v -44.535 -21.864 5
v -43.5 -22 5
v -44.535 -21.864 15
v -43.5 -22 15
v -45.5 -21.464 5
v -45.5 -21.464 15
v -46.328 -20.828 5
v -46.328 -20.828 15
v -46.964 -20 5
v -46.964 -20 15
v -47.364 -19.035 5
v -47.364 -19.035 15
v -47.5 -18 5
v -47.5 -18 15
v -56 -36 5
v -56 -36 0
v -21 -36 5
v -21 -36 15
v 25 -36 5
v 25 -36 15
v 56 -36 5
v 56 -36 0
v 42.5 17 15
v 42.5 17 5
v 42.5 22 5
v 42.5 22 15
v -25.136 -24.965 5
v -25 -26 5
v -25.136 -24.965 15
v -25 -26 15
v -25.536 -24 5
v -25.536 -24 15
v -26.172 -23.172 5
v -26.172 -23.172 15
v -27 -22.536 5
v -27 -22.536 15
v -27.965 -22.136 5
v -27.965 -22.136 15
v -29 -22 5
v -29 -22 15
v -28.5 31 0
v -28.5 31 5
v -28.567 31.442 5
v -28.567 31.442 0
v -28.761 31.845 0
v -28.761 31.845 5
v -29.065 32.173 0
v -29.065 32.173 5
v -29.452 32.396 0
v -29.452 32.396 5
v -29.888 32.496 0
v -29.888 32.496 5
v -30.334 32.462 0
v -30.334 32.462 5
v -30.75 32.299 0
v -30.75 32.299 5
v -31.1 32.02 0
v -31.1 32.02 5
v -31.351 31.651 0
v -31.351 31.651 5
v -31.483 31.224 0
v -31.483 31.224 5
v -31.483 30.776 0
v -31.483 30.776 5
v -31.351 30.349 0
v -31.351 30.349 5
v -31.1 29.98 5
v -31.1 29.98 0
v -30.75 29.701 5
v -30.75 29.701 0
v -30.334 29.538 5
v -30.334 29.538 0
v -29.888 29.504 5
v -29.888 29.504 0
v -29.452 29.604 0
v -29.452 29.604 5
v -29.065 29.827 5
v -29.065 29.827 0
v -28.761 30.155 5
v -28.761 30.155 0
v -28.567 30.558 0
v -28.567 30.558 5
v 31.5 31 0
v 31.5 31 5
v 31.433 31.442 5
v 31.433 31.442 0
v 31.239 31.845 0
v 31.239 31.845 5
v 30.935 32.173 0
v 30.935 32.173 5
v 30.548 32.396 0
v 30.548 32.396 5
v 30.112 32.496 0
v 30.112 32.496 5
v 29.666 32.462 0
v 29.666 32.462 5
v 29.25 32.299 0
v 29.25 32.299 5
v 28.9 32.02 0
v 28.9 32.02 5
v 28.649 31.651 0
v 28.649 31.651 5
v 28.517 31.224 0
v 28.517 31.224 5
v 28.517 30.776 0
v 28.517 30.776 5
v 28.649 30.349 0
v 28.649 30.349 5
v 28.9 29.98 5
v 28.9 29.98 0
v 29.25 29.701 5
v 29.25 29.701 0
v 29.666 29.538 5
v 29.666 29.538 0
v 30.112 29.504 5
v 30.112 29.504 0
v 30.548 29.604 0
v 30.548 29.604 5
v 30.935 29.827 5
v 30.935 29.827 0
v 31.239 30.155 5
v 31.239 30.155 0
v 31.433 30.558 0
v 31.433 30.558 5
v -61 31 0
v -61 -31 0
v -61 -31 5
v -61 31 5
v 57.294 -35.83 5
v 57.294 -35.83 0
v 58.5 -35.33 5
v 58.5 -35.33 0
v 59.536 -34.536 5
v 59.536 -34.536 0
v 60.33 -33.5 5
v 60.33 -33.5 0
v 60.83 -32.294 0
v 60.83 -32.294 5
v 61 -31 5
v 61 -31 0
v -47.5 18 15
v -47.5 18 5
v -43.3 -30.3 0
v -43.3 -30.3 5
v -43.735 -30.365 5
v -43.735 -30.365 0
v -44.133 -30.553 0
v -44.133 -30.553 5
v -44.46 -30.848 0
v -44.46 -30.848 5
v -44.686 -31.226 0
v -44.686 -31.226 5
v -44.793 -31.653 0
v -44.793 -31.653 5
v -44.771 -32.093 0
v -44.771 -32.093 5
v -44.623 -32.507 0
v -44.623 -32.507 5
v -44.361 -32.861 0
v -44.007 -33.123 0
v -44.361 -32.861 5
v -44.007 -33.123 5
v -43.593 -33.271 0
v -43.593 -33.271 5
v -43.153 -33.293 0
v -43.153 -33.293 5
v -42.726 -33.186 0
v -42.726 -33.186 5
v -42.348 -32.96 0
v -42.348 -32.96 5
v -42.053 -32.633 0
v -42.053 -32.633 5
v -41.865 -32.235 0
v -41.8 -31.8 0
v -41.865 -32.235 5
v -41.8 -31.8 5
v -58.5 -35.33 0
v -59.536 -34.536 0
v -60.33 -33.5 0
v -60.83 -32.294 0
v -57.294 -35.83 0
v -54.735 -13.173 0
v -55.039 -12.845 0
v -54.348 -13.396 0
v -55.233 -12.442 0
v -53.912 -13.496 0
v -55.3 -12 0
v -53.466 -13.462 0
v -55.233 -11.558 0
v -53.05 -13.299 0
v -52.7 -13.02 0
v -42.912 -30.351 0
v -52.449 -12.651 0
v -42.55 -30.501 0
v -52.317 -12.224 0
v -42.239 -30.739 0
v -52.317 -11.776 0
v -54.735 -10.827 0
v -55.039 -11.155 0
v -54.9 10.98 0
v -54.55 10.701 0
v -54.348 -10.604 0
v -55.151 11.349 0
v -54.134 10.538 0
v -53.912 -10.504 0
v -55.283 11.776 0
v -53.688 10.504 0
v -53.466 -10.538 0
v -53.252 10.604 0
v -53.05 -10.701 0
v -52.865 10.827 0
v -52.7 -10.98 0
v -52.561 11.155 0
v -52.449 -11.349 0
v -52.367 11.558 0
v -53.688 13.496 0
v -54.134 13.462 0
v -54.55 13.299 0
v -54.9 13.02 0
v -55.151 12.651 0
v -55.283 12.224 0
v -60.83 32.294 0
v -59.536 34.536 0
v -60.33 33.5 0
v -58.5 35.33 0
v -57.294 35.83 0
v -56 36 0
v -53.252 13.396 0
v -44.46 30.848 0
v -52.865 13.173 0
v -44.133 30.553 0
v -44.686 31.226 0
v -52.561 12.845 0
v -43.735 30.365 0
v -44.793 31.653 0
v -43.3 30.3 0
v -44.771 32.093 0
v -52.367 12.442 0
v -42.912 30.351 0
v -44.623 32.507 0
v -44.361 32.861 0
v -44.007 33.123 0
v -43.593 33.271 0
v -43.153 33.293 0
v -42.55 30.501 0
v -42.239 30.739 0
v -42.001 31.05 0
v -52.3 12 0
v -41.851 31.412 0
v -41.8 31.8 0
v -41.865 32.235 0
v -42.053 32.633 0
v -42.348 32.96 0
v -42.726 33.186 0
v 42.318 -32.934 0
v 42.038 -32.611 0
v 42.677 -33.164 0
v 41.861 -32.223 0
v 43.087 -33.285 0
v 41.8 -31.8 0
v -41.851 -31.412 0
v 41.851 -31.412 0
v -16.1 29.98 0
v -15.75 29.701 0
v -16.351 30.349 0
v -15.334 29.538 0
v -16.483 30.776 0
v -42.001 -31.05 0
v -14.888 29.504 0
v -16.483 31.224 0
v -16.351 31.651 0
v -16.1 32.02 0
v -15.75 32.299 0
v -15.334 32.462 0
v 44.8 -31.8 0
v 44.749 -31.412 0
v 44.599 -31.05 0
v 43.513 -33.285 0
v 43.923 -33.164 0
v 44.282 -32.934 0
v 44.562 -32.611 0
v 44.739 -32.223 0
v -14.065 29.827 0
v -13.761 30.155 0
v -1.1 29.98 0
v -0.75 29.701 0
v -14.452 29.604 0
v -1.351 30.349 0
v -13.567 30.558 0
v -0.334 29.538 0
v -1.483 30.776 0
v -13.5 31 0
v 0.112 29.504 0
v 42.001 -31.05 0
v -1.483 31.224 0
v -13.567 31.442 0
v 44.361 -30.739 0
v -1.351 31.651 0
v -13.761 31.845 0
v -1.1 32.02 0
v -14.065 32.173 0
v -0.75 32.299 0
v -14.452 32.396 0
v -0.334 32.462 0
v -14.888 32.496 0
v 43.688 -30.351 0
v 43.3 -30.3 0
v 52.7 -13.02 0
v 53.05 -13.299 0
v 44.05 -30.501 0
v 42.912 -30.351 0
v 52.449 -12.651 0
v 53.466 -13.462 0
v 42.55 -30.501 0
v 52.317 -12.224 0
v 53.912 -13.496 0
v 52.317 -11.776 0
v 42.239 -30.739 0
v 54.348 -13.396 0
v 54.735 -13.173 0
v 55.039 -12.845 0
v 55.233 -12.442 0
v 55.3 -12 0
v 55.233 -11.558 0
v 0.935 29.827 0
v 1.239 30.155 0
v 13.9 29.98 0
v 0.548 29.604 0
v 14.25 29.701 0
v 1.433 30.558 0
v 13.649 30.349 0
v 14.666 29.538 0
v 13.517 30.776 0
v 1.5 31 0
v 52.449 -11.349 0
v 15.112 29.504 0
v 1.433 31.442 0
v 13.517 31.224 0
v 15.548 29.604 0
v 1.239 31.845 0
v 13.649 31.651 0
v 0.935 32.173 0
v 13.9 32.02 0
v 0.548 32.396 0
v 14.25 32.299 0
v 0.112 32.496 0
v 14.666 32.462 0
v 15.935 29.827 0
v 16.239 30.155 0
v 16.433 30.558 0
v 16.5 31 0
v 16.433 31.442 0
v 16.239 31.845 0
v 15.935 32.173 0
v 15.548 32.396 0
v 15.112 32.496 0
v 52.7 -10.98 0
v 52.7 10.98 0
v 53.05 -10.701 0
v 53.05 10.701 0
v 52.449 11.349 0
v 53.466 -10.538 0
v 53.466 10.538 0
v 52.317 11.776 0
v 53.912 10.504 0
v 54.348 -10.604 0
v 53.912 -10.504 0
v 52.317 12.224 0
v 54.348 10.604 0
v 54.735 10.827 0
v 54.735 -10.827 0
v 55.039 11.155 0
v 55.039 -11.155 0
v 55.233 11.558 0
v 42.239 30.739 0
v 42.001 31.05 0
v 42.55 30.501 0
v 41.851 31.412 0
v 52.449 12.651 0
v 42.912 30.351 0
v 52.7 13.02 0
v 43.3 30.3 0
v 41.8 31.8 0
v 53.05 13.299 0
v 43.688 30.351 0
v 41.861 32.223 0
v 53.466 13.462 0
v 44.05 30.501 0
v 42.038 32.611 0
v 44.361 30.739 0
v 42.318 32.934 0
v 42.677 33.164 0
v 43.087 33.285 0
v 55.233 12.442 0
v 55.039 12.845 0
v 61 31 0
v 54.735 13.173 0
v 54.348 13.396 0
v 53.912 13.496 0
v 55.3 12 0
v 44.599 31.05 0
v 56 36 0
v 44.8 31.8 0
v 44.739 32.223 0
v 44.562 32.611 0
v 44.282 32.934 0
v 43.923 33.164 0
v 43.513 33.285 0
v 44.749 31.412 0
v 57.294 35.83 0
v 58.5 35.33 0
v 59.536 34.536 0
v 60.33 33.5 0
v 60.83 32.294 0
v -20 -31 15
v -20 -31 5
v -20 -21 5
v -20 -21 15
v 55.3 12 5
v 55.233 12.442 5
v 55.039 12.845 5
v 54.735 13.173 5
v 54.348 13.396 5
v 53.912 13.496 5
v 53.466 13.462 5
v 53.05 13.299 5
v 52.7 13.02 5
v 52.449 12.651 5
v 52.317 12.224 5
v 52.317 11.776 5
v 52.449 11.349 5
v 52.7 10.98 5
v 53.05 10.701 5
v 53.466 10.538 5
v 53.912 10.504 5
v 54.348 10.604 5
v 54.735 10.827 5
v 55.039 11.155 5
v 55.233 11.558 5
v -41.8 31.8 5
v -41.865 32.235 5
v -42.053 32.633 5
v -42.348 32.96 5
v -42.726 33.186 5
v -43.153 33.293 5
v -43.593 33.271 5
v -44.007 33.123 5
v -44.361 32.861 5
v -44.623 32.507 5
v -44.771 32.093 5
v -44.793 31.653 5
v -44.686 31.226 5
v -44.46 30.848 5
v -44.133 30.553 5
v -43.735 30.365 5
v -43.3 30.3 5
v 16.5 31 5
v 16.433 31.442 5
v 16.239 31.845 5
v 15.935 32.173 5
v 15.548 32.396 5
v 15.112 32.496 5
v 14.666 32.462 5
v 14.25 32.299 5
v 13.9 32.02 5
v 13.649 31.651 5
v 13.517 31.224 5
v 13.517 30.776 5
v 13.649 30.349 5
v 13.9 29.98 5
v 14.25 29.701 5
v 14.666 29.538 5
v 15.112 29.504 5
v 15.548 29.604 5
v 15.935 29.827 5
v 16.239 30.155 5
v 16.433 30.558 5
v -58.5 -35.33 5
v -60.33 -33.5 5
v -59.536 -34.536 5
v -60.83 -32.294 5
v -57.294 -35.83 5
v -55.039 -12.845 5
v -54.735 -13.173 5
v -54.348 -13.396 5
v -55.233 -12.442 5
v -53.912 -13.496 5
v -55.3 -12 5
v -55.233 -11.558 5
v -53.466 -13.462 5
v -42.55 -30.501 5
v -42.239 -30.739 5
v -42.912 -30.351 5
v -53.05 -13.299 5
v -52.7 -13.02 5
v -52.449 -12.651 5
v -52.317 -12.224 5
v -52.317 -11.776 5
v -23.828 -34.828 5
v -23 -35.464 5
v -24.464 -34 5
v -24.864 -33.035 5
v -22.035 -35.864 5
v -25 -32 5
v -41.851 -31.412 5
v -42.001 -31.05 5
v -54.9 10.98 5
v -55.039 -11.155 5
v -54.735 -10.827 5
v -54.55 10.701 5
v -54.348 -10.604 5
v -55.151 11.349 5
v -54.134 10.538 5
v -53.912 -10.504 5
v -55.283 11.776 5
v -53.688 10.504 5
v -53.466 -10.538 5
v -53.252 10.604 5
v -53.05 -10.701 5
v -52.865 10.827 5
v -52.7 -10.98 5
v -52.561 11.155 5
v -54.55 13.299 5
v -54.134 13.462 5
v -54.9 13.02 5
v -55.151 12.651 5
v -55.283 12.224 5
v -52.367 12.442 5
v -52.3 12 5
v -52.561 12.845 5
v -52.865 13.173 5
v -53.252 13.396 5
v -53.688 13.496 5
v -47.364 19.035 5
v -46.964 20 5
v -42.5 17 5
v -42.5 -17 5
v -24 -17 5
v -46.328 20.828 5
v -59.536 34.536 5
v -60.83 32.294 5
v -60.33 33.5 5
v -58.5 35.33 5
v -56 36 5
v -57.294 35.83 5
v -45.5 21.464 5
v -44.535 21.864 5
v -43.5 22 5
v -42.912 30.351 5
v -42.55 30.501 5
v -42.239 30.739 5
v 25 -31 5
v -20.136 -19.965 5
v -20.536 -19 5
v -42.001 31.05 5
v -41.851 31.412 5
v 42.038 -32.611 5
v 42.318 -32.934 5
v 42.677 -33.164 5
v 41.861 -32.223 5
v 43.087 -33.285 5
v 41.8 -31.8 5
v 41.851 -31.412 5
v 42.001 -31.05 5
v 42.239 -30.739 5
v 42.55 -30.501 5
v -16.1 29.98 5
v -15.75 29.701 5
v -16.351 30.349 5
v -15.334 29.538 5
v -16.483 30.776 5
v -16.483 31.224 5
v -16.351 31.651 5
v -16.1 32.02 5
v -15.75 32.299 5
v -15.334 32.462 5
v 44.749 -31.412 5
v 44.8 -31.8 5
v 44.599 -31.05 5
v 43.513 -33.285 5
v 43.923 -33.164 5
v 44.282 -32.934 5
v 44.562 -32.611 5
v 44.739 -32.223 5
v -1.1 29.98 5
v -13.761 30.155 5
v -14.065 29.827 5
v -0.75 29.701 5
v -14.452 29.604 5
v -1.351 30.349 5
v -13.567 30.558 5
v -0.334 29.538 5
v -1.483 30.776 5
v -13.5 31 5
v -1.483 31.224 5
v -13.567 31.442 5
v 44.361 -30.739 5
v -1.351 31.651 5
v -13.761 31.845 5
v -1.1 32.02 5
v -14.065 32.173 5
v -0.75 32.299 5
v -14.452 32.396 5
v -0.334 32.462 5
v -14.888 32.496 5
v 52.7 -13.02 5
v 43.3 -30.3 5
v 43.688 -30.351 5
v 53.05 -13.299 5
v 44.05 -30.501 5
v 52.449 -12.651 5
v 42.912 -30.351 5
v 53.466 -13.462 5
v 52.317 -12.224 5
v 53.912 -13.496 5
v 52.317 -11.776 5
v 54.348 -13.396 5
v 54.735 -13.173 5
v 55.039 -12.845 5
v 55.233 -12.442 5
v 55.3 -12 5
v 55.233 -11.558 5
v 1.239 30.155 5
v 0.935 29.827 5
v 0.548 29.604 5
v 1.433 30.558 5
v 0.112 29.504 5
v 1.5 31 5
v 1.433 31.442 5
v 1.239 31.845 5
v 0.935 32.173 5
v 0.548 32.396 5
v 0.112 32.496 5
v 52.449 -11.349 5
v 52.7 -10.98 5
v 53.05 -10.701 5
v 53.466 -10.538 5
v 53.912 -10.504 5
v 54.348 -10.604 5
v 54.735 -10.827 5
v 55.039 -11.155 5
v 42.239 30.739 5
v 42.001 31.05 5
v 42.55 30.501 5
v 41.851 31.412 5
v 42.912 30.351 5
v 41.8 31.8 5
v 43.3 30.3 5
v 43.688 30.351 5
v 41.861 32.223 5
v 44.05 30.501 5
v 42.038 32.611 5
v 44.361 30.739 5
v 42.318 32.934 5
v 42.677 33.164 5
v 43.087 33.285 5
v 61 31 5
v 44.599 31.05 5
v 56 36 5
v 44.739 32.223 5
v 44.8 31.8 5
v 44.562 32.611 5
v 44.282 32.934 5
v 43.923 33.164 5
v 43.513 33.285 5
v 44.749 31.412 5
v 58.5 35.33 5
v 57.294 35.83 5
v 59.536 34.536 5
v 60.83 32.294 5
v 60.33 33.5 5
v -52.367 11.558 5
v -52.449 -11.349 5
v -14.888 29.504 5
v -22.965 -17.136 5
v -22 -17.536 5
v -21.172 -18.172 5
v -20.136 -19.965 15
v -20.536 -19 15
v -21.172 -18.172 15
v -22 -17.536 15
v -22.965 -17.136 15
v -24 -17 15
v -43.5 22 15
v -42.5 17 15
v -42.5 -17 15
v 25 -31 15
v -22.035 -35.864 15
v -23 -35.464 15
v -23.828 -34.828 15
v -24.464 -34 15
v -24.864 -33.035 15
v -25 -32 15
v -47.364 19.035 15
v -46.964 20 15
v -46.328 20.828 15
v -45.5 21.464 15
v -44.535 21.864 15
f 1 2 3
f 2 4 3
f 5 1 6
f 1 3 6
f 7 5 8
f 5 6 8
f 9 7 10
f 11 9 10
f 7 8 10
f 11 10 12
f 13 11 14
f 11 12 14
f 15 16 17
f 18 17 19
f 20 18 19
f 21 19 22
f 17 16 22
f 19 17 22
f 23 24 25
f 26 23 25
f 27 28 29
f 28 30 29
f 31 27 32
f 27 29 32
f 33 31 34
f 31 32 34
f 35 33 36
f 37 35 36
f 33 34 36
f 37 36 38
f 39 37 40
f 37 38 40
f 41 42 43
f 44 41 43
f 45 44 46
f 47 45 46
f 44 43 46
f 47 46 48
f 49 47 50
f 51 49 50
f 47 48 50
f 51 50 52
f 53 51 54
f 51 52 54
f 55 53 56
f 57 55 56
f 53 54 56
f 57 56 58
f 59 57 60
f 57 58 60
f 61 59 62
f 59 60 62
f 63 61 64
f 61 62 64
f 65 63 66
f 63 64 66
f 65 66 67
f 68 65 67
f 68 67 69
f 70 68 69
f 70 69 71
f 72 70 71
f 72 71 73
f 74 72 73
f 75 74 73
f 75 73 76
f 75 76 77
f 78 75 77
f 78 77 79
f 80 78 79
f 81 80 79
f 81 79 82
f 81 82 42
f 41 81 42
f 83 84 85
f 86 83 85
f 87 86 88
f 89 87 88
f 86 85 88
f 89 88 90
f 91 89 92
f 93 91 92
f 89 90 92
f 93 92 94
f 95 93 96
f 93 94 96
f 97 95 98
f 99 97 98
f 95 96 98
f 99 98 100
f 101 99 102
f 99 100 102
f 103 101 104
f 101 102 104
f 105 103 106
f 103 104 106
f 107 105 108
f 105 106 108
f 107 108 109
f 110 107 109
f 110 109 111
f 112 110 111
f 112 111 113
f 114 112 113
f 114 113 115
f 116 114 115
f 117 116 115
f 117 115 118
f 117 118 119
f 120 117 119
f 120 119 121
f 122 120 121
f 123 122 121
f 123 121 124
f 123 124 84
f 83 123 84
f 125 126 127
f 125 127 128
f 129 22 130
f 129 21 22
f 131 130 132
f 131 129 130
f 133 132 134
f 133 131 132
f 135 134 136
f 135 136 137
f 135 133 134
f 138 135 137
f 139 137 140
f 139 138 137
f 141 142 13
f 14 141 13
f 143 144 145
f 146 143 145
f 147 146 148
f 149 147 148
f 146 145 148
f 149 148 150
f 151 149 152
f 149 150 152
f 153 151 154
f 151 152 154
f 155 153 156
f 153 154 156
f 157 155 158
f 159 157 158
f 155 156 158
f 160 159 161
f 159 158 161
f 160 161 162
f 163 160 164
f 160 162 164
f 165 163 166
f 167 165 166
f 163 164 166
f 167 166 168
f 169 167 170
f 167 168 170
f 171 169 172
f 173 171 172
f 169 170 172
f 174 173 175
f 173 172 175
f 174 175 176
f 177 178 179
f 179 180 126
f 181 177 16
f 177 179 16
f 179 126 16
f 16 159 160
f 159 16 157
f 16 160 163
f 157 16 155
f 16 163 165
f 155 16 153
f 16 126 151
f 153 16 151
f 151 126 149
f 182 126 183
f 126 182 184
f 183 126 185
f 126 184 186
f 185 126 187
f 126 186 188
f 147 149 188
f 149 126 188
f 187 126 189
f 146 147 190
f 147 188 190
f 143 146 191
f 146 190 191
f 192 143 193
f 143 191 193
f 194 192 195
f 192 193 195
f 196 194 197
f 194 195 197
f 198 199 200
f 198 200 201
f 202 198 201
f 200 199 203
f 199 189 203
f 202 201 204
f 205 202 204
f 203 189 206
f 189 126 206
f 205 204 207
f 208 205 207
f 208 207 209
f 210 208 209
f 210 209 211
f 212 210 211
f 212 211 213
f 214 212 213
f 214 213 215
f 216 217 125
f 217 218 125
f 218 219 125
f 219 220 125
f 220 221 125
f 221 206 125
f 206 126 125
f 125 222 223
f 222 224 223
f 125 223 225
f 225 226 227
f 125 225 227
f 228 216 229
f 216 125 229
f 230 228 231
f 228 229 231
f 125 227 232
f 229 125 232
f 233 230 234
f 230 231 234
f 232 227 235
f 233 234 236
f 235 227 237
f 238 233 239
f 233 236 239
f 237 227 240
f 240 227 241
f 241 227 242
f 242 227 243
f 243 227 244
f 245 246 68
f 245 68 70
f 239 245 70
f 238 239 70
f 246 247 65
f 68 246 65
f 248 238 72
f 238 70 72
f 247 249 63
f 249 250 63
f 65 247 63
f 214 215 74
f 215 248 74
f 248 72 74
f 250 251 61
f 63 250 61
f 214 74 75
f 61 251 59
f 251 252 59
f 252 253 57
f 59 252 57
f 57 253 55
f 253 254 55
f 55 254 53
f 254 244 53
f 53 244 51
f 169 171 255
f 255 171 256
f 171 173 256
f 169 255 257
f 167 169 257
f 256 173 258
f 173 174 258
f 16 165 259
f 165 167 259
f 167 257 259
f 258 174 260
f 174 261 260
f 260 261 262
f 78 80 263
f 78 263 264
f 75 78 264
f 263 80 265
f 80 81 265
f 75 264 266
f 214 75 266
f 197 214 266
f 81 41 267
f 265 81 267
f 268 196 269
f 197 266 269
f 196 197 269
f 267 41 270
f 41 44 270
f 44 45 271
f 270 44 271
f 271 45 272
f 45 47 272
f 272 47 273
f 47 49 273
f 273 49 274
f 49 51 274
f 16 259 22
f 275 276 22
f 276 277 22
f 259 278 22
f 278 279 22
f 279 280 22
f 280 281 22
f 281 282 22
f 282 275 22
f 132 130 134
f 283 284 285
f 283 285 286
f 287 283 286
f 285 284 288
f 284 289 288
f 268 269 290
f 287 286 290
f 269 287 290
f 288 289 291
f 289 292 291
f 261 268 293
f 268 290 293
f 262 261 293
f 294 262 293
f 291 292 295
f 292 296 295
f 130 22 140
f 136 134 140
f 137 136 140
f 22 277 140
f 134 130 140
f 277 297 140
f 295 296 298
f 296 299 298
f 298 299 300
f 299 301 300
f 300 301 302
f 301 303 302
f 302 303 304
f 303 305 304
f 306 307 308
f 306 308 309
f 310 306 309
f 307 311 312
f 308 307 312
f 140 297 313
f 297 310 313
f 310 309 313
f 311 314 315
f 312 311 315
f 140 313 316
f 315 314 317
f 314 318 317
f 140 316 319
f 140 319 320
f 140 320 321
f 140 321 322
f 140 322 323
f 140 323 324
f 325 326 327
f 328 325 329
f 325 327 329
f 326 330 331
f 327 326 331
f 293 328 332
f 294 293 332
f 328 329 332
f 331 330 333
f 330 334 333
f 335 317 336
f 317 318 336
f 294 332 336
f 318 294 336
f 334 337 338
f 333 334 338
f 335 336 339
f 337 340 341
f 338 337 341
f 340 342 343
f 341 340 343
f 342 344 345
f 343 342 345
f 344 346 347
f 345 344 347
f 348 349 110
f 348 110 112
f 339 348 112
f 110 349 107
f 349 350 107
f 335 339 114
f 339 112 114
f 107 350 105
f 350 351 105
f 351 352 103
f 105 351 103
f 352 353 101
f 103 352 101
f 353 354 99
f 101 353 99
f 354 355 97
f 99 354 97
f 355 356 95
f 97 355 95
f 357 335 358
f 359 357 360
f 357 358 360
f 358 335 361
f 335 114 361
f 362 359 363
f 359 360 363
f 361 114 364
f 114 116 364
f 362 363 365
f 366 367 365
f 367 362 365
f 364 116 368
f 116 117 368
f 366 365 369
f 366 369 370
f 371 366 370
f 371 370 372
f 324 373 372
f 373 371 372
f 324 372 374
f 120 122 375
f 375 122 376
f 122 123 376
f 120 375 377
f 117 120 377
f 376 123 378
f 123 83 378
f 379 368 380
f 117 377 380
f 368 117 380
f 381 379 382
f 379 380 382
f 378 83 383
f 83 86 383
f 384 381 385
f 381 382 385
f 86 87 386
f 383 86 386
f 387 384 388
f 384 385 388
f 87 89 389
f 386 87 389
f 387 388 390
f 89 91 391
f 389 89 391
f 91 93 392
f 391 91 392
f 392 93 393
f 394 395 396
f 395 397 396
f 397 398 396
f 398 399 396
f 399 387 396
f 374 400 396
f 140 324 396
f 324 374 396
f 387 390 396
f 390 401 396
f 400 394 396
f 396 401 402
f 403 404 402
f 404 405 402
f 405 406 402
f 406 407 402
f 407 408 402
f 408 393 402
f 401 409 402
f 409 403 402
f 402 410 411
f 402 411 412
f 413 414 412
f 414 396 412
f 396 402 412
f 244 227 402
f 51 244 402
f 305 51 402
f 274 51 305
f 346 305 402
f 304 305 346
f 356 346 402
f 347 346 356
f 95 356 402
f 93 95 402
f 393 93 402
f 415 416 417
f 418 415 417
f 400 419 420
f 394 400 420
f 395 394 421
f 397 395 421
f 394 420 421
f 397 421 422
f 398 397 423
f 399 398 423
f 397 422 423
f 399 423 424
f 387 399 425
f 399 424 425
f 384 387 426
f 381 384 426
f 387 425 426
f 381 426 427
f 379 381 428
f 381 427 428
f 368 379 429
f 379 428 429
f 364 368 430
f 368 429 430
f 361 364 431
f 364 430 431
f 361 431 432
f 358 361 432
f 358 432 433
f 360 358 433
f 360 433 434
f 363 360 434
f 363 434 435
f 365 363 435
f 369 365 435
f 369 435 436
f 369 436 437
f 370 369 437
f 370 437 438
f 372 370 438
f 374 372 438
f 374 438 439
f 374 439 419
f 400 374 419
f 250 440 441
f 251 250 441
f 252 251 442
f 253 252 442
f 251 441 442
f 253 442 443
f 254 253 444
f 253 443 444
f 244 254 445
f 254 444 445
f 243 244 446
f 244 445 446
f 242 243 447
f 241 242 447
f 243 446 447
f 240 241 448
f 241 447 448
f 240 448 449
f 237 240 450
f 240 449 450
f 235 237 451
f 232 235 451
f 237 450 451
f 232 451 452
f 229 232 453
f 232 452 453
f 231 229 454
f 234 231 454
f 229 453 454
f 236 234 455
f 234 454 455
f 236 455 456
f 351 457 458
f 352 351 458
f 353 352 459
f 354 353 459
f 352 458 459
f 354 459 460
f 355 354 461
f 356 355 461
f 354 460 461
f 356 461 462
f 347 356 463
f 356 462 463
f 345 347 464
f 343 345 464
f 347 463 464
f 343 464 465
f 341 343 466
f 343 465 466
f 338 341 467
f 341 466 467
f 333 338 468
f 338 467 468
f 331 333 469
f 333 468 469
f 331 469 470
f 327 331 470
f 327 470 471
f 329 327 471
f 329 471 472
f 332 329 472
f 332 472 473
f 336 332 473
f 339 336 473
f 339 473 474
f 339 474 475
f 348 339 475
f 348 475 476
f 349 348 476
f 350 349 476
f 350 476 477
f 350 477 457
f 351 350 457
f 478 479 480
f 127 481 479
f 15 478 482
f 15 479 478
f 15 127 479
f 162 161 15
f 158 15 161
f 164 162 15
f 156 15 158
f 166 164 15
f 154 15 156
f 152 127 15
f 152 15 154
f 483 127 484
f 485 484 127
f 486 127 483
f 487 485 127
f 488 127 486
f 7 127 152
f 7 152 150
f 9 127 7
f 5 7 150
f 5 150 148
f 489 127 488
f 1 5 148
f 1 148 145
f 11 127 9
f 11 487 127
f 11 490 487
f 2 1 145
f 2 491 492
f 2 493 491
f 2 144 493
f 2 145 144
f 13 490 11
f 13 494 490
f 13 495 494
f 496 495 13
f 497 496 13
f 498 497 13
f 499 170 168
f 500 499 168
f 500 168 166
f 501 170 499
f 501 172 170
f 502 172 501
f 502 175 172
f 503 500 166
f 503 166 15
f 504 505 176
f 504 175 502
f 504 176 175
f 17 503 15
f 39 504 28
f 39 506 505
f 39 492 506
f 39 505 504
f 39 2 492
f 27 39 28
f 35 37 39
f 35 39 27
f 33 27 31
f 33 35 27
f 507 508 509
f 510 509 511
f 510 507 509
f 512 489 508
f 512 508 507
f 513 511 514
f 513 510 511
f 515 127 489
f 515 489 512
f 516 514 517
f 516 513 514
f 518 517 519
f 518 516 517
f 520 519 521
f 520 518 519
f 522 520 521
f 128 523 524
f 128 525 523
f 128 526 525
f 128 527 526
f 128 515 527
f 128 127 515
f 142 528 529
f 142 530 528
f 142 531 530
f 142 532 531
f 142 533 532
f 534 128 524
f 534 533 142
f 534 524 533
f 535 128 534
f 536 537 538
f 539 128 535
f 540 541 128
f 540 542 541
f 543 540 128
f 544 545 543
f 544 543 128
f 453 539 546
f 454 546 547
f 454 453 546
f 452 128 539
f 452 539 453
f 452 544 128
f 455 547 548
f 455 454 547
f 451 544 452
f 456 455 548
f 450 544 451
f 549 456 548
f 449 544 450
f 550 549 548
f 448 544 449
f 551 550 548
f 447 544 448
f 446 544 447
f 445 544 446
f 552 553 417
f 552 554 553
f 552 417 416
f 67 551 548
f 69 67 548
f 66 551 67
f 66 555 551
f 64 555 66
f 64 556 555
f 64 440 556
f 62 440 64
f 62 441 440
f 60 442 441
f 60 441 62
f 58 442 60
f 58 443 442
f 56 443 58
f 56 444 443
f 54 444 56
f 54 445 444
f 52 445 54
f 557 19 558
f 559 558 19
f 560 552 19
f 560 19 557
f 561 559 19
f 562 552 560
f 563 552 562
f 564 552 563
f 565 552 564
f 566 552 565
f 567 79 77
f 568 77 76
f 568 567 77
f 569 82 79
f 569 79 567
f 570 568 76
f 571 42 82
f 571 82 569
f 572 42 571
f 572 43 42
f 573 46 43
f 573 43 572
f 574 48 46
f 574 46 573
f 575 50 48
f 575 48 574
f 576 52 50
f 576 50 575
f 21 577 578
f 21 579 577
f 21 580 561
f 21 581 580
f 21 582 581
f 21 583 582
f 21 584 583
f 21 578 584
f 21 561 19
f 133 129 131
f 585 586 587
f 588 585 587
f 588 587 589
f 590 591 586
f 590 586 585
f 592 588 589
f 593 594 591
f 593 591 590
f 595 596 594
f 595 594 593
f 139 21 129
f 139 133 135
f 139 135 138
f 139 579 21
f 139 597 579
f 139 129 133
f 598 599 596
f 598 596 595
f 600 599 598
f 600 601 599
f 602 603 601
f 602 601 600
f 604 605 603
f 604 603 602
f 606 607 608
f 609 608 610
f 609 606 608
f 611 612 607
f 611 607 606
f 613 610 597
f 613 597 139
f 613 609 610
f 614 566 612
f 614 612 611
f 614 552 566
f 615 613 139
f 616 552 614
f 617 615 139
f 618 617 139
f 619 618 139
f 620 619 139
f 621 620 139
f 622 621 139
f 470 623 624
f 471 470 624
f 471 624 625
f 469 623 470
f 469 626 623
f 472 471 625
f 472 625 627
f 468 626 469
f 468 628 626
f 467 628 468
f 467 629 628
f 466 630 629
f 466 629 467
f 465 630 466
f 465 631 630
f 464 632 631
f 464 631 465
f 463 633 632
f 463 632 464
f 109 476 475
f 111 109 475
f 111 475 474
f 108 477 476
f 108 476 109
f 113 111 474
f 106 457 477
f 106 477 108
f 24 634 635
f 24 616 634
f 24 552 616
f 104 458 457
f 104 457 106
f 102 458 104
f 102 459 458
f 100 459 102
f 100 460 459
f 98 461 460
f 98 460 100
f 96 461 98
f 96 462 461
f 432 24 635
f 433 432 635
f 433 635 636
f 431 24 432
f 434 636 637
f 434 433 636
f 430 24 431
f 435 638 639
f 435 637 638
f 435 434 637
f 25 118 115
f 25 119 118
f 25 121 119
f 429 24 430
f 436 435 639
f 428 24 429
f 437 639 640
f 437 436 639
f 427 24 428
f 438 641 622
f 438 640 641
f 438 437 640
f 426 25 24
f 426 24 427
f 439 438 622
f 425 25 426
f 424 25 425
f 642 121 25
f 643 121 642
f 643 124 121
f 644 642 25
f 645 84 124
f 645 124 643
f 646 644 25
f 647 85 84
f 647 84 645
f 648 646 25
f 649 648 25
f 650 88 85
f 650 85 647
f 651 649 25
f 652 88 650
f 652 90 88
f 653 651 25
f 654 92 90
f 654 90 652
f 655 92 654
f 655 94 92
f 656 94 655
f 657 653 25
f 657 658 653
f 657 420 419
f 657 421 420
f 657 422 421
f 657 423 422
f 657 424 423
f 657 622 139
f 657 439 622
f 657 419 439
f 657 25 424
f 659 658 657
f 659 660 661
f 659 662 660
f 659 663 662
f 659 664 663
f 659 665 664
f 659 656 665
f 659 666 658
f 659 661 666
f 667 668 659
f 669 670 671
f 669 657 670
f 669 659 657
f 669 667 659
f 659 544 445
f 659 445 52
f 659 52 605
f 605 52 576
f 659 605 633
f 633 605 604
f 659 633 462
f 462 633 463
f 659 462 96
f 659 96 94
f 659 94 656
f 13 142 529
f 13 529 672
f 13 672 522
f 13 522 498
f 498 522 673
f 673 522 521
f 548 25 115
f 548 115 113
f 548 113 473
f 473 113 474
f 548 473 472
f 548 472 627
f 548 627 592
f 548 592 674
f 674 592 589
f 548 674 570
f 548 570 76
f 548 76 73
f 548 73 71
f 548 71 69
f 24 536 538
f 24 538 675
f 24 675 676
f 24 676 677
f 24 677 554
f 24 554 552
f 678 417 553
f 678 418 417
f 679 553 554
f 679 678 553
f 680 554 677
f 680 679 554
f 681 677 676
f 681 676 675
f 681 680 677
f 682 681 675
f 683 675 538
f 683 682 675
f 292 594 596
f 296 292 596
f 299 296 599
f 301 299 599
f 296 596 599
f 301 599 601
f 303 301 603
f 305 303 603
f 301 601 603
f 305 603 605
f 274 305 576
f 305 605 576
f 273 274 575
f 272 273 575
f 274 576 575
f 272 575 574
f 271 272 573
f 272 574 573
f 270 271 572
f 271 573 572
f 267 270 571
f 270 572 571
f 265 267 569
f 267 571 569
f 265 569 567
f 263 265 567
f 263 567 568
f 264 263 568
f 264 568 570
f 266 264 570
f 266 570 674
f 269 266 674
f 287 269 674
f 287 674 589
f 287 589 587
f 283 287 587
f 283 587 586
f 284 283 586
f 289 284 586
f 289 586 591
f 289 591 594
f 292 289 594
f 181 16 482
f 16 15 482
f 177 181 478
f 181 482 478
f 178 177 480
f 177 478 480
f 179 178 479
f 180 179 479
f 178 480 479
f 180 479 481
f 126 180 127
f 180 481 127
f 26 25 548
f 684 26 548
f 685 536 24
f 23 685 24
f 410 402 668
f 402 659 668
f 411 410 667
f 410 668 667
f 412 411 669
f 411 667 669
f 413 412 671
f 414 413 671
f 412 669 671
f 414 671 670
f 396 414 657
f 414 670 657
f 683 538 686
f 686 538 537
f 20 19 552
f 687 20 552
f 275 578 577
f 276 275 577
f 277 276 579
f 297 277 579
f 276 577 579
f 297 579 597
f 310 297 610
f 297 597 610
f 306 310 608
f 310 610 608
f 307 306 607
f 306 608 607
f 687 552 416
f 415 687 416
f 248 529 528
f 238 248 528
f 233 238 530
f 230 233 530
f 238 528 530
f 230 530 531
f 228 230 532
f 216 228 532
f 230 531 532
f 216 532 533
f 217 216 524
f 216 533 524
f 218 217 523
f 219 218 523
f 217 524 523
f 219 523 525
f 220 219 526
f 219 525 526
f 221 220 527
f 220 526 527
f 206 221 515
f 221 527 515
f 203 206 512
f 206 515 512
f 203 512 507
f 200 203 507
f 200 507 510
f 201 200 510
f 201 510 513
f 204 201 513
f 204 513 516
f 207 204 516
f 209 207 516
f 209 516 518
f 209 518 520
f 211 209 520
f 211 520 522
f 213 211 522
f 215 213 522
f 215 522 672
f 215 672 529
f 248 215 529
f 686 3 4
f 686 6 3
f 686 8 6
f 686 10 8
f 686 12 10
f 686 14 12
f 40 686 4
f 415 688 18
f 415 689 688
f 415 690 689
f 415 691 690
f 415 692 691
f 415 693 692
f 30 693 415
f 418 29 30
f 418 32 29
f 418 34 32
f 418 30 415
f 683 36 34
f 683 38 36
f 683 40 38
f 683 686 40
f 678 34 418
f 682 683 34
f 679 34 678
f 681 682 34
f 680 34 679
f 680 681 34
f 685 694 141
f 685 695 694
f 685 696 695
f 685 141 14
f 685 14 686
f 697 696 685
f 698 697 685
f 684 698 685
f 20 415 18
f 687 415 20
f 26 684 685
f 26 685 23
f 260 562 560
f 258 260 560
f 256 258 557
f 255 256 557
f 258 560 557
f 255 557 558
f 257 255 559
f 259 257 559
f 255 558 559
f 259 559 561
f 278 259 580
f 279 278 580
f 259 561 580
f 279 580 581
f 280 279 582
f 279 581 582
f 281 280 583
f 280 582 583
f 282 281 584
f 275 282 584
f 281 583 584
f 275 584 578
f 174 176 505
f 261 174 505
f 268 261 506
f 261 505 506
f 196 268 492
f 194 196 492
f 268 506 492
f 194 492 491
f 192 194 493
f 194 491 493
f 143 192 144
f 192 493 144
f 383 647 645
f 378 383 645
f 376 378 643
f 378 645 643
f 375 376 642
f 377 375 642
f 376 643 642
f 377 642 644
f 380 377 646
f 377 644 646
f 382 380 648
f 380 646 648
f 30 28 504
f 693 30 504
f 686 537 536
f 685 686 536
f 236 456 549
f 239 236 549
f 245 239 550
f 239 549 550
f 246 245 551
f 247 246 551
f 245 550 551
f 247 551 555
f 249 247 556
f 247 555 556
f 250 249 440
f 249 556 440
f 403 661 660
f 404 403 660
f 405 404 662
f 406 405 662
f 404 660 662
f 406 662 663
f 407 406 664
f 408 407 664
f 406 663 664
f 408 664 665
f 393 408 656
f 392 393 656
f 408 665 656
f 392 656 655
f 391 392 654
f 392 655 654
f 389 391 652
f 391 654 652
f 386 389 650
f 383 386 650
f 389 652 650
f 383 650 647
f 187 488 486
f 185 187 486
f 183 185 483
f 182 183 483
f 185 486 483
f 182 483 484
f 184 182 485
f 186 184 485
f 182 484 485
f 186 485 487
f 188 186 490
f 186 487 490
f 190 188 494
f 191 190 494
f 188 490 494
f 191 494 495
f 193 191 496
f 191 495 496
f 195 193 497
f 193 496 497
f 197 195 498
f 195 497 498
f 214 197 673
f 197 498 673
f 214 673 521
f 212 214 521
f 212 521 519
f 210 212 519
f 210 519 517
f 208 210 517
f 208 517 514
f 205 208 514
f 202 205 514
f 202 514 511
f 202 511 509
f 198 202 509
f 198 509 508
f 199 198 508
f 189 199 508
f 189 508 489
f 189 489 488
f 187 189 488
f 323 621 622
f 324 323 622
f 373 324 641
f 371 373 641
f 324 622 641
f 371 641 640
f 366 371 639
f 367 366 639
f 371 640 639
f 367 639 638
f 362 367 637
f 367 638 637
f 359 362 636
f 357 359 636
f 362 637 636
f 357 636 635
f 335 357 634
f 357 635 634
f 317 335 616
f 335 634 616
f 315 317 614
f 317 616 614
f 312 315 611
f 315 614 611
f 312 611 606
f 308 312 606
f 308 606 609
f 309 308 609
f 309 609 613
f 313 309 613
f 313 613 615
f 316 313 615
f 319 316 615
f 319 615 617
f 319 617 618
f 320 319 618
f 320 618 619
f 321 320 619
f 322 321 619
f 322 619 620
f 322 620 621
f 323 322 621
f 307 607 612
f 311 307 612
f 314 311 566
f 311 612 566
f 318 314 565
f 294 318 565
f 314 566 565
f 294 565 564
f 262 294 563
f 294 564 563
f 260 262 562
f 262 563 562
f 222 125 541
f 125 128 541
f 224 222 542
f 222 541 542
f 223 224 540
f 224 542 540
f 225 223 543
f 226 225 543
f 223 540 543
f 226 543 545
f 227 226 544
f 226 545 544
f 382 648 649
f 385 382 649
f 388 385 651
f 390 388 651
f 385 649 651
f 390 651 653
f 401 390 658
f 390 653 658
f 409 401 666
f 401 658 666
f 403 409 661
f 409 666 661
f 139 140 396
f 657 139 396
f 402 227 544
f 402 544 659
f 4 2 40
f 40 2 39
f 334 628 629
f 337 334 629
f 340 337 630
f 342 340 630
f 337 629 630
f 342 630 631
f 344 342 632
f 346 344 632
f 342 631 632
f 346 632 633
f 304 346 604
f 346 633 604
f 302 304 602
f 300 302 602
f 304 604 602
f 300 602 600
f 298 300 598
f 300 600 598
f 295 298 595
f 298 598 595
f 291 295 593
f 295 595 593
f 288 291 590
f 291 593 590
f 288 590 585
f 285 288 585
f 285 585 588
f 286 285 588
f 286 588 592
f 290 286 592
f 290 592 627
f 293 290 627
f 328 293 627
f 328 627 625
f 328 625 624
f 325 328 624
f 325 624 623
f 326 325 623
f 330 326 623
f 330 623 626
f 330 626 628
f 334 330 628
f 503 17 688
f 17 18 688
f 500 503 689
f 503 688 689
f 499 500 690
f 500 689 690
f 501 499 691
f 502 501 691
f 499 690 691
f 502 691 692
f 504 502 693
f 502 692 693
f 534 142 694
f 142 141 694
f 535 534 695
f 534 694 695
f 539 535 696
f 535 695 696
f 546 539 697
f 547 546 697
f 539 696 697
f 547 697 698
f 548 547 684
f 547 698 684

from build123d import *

# Parameters (mm, degrees)
SKETCH_1_W          = 122
SKETCH_1_H          = 72
EXTRUDE_1_DEPTH     = 5
SKETCH_4_R          = 1.5
CUT_EXTRUDE_2_DEPTH = 10
SKETCH_5_W          = 5
SKETCH_5_H          = 5
EXTRUDE_3_DEPTH     = 10
SKETCH_6_R          = 1.5
CUT_EXTRUDE_3_DEPTH = 15
CUT_EXTRUDE_4_DEPTH = 25
FILLET_1_R          = 4
FILLET_3_R          = 5


with BuildPart() as part:
    # 草图1 → 凸台-拉伸1 (new body)
    with BuildSketch(Plane.XY):
        Rectangle(SKETCH_1_W, SKETCH_1_H)
    extrude(amount=EXTRUDE_1_DEPTH)

    # 草图4 → 切除-拉伸2 (cut)
    with BuildSketch(Plane.XY.offset(5)):
        with Locations((-53.8, 12)):
            Circle(SKETCH_4_R)
        with Locations((53.8, 12)):
            Circle(SKETCH_4_R)
        with Locations((53.8, -12)):
            Circle(SKETCH_4_R)
        with Locations(Location((-53.8, -12, 0), (0, 0, 180))):
            Circle(SKETCH_4_R)
    extrude(amount=-CUT_EXTRUDE_2_DEPTH, mode=Mode.SUBTRACT)

    # 草图5 → 凸台-拉伸3 (add)
    with BuildSketch(Plane.XY.offset(5)):
        Polygon((-42.5, 17), (42.5, 17), (42.5, 22), (-47.5, 22), (-47.5, -22), (-25, -22), (-25, -17), (-42.5, -17), align=None)
        with Locations((-22.5, -19.5)):
            Rectangle(SKETCH_5_W, SKETCH_5_H)
        Polygon((25, -36), (25, -31), (20, -31), (-20, -31), (-20, -22), (-25, -22), (-25, -36), align=None)
    extrude(amount=EXTRUDE_3_DEPTH)

    # 草图6 → 切除-拉伸3 (cut)
    with BuildSketch(Plane.XY.offset(5)):
        with Locations((0, 31)):
            Circle(SKETCH_6_R)
        with Locations((15, 31)):
            Circle(SKETCH_6_R)
        with Locations((30, 31)):
            Circle(SKETCH_6_R)
        with Locations((-15, 31)):
            Circle(SKETCH_6_R)
        with Locations((-30, 31)):
            Circle(SKETCH_6_R)
    extrude(amount=-CUT_EXTRUDE_3_DEPTH, mode=Mode.SUBTRACT)

    # 草图7 → 切除-拉伸4 (cut)
    with BuildSketch(Plane.XY.offset(5)):
        with BuildLine():
            ThreePointArc((44.8, 31.8), (43.3, 33.3), (41.8, 31.8))
            Line((41.8, 31.8), (43.3, 31.8))
            Line((43.3, 31.8), (43.3, 30.3))
            ThreePointArc((43.3, 30.3), (44.360660172, 30.739339828), (44.8, 31.8))
        make_face()
        with BuildLine():
            Line((43.3, 31.8), (41.8, 31.8))
            ThreePointArc((41.8, 31.8), (42.239339828, 30.739339828), (43.3, 30.3))
            Line((43.3, 30.3), (43.3, 31.8))
        make_face()
        with BuildLine():
            ThreePointArc((44.8, -31.8), (44.360660172, -30.739339828), (43.3, -30.3))
            Line((43.3, -30.3), (43.3, -31.8))
            Line((43.3, -31.8), (41.8, -31.8))
            ThreePointArc((41.8, -31.8), (43.3, -33.3), (44.8, -31.8))
        make_face()
        with BuildLine():
            Line((43.3, -31.8), (43.3, -30.3))
            ThreePointArc((43.3, -30.3), (42.239339828, -30.739339828), (41.8, -31.8))
            Line((41.8, -31.8), (43.3, -31.8))
        make_face()
        with BuildLine():
            ThreePointArc((-41.8, -31.8), (-42.239339828, -30.739339828), (-43.3, -30.3))
            Line((-43.3, -30.3), (-43.3, -31.8))
            Line((-43.3, -31.8), (-41.8, -31.8))
        make_face()
        with BuildLine():
            Line((-43.3, -31.8), (-43.3, -30.3))
            ThreePointArc((-43.3, -30.3), (-44.360660172, -32.860660172), (-41.8, -31.8))
            Line((-41.8, -31.8), (-43.3, -31.8))
        make_face()
        with BuildLine():
            Line((-43.3, 30.3), (-43.3, 31.8))
            Line((-43.3, 31.8), (-41.8, 31.8))
            ThreePointArc((-41.8, 31.8), (-44.360660172, 32.860660172), (-43.3, 30.3))
        make_face()
        with BuildLine():
            Line((-41.8, 31.8), (-43.3, 31.8))
            Line((-43.3, 31.8), (-43.3, 30.3))
            ThreePointArc((-43.3, 30.3), (-42.239339828, 30.739339828), (-41.8, 31.8))
        make_face()
    extrude(amount=-CUT_EXTRUDE_4_DEPTH, mode=Mode.SUBTRACT)

    # 圆角1
    fillet_1_edges = [part.edges().sort_by_distance(p)[0] for p in [
        (-47.5, 22, 10),
        (-47.5, -22, 10),
        (-25, -22, 10),
        (-25, -36, 10),
        (-20, -17, 10),
    ]]
    fillet(fillet_1_edges, radius=FILLET_1_R)

    # 圆角3
    fillet_3_edges = [part.edges().sort_by_distance(p)[0] for p in [
        (61, -36, 2.5),
        (-61, -36, 2.5),
        (-61, 36, 2.5),
        (61, 36, 2.5),
    ]]
    fillet(fillet_3_edges, radius=FILLET_3_R)


solid = part.part
